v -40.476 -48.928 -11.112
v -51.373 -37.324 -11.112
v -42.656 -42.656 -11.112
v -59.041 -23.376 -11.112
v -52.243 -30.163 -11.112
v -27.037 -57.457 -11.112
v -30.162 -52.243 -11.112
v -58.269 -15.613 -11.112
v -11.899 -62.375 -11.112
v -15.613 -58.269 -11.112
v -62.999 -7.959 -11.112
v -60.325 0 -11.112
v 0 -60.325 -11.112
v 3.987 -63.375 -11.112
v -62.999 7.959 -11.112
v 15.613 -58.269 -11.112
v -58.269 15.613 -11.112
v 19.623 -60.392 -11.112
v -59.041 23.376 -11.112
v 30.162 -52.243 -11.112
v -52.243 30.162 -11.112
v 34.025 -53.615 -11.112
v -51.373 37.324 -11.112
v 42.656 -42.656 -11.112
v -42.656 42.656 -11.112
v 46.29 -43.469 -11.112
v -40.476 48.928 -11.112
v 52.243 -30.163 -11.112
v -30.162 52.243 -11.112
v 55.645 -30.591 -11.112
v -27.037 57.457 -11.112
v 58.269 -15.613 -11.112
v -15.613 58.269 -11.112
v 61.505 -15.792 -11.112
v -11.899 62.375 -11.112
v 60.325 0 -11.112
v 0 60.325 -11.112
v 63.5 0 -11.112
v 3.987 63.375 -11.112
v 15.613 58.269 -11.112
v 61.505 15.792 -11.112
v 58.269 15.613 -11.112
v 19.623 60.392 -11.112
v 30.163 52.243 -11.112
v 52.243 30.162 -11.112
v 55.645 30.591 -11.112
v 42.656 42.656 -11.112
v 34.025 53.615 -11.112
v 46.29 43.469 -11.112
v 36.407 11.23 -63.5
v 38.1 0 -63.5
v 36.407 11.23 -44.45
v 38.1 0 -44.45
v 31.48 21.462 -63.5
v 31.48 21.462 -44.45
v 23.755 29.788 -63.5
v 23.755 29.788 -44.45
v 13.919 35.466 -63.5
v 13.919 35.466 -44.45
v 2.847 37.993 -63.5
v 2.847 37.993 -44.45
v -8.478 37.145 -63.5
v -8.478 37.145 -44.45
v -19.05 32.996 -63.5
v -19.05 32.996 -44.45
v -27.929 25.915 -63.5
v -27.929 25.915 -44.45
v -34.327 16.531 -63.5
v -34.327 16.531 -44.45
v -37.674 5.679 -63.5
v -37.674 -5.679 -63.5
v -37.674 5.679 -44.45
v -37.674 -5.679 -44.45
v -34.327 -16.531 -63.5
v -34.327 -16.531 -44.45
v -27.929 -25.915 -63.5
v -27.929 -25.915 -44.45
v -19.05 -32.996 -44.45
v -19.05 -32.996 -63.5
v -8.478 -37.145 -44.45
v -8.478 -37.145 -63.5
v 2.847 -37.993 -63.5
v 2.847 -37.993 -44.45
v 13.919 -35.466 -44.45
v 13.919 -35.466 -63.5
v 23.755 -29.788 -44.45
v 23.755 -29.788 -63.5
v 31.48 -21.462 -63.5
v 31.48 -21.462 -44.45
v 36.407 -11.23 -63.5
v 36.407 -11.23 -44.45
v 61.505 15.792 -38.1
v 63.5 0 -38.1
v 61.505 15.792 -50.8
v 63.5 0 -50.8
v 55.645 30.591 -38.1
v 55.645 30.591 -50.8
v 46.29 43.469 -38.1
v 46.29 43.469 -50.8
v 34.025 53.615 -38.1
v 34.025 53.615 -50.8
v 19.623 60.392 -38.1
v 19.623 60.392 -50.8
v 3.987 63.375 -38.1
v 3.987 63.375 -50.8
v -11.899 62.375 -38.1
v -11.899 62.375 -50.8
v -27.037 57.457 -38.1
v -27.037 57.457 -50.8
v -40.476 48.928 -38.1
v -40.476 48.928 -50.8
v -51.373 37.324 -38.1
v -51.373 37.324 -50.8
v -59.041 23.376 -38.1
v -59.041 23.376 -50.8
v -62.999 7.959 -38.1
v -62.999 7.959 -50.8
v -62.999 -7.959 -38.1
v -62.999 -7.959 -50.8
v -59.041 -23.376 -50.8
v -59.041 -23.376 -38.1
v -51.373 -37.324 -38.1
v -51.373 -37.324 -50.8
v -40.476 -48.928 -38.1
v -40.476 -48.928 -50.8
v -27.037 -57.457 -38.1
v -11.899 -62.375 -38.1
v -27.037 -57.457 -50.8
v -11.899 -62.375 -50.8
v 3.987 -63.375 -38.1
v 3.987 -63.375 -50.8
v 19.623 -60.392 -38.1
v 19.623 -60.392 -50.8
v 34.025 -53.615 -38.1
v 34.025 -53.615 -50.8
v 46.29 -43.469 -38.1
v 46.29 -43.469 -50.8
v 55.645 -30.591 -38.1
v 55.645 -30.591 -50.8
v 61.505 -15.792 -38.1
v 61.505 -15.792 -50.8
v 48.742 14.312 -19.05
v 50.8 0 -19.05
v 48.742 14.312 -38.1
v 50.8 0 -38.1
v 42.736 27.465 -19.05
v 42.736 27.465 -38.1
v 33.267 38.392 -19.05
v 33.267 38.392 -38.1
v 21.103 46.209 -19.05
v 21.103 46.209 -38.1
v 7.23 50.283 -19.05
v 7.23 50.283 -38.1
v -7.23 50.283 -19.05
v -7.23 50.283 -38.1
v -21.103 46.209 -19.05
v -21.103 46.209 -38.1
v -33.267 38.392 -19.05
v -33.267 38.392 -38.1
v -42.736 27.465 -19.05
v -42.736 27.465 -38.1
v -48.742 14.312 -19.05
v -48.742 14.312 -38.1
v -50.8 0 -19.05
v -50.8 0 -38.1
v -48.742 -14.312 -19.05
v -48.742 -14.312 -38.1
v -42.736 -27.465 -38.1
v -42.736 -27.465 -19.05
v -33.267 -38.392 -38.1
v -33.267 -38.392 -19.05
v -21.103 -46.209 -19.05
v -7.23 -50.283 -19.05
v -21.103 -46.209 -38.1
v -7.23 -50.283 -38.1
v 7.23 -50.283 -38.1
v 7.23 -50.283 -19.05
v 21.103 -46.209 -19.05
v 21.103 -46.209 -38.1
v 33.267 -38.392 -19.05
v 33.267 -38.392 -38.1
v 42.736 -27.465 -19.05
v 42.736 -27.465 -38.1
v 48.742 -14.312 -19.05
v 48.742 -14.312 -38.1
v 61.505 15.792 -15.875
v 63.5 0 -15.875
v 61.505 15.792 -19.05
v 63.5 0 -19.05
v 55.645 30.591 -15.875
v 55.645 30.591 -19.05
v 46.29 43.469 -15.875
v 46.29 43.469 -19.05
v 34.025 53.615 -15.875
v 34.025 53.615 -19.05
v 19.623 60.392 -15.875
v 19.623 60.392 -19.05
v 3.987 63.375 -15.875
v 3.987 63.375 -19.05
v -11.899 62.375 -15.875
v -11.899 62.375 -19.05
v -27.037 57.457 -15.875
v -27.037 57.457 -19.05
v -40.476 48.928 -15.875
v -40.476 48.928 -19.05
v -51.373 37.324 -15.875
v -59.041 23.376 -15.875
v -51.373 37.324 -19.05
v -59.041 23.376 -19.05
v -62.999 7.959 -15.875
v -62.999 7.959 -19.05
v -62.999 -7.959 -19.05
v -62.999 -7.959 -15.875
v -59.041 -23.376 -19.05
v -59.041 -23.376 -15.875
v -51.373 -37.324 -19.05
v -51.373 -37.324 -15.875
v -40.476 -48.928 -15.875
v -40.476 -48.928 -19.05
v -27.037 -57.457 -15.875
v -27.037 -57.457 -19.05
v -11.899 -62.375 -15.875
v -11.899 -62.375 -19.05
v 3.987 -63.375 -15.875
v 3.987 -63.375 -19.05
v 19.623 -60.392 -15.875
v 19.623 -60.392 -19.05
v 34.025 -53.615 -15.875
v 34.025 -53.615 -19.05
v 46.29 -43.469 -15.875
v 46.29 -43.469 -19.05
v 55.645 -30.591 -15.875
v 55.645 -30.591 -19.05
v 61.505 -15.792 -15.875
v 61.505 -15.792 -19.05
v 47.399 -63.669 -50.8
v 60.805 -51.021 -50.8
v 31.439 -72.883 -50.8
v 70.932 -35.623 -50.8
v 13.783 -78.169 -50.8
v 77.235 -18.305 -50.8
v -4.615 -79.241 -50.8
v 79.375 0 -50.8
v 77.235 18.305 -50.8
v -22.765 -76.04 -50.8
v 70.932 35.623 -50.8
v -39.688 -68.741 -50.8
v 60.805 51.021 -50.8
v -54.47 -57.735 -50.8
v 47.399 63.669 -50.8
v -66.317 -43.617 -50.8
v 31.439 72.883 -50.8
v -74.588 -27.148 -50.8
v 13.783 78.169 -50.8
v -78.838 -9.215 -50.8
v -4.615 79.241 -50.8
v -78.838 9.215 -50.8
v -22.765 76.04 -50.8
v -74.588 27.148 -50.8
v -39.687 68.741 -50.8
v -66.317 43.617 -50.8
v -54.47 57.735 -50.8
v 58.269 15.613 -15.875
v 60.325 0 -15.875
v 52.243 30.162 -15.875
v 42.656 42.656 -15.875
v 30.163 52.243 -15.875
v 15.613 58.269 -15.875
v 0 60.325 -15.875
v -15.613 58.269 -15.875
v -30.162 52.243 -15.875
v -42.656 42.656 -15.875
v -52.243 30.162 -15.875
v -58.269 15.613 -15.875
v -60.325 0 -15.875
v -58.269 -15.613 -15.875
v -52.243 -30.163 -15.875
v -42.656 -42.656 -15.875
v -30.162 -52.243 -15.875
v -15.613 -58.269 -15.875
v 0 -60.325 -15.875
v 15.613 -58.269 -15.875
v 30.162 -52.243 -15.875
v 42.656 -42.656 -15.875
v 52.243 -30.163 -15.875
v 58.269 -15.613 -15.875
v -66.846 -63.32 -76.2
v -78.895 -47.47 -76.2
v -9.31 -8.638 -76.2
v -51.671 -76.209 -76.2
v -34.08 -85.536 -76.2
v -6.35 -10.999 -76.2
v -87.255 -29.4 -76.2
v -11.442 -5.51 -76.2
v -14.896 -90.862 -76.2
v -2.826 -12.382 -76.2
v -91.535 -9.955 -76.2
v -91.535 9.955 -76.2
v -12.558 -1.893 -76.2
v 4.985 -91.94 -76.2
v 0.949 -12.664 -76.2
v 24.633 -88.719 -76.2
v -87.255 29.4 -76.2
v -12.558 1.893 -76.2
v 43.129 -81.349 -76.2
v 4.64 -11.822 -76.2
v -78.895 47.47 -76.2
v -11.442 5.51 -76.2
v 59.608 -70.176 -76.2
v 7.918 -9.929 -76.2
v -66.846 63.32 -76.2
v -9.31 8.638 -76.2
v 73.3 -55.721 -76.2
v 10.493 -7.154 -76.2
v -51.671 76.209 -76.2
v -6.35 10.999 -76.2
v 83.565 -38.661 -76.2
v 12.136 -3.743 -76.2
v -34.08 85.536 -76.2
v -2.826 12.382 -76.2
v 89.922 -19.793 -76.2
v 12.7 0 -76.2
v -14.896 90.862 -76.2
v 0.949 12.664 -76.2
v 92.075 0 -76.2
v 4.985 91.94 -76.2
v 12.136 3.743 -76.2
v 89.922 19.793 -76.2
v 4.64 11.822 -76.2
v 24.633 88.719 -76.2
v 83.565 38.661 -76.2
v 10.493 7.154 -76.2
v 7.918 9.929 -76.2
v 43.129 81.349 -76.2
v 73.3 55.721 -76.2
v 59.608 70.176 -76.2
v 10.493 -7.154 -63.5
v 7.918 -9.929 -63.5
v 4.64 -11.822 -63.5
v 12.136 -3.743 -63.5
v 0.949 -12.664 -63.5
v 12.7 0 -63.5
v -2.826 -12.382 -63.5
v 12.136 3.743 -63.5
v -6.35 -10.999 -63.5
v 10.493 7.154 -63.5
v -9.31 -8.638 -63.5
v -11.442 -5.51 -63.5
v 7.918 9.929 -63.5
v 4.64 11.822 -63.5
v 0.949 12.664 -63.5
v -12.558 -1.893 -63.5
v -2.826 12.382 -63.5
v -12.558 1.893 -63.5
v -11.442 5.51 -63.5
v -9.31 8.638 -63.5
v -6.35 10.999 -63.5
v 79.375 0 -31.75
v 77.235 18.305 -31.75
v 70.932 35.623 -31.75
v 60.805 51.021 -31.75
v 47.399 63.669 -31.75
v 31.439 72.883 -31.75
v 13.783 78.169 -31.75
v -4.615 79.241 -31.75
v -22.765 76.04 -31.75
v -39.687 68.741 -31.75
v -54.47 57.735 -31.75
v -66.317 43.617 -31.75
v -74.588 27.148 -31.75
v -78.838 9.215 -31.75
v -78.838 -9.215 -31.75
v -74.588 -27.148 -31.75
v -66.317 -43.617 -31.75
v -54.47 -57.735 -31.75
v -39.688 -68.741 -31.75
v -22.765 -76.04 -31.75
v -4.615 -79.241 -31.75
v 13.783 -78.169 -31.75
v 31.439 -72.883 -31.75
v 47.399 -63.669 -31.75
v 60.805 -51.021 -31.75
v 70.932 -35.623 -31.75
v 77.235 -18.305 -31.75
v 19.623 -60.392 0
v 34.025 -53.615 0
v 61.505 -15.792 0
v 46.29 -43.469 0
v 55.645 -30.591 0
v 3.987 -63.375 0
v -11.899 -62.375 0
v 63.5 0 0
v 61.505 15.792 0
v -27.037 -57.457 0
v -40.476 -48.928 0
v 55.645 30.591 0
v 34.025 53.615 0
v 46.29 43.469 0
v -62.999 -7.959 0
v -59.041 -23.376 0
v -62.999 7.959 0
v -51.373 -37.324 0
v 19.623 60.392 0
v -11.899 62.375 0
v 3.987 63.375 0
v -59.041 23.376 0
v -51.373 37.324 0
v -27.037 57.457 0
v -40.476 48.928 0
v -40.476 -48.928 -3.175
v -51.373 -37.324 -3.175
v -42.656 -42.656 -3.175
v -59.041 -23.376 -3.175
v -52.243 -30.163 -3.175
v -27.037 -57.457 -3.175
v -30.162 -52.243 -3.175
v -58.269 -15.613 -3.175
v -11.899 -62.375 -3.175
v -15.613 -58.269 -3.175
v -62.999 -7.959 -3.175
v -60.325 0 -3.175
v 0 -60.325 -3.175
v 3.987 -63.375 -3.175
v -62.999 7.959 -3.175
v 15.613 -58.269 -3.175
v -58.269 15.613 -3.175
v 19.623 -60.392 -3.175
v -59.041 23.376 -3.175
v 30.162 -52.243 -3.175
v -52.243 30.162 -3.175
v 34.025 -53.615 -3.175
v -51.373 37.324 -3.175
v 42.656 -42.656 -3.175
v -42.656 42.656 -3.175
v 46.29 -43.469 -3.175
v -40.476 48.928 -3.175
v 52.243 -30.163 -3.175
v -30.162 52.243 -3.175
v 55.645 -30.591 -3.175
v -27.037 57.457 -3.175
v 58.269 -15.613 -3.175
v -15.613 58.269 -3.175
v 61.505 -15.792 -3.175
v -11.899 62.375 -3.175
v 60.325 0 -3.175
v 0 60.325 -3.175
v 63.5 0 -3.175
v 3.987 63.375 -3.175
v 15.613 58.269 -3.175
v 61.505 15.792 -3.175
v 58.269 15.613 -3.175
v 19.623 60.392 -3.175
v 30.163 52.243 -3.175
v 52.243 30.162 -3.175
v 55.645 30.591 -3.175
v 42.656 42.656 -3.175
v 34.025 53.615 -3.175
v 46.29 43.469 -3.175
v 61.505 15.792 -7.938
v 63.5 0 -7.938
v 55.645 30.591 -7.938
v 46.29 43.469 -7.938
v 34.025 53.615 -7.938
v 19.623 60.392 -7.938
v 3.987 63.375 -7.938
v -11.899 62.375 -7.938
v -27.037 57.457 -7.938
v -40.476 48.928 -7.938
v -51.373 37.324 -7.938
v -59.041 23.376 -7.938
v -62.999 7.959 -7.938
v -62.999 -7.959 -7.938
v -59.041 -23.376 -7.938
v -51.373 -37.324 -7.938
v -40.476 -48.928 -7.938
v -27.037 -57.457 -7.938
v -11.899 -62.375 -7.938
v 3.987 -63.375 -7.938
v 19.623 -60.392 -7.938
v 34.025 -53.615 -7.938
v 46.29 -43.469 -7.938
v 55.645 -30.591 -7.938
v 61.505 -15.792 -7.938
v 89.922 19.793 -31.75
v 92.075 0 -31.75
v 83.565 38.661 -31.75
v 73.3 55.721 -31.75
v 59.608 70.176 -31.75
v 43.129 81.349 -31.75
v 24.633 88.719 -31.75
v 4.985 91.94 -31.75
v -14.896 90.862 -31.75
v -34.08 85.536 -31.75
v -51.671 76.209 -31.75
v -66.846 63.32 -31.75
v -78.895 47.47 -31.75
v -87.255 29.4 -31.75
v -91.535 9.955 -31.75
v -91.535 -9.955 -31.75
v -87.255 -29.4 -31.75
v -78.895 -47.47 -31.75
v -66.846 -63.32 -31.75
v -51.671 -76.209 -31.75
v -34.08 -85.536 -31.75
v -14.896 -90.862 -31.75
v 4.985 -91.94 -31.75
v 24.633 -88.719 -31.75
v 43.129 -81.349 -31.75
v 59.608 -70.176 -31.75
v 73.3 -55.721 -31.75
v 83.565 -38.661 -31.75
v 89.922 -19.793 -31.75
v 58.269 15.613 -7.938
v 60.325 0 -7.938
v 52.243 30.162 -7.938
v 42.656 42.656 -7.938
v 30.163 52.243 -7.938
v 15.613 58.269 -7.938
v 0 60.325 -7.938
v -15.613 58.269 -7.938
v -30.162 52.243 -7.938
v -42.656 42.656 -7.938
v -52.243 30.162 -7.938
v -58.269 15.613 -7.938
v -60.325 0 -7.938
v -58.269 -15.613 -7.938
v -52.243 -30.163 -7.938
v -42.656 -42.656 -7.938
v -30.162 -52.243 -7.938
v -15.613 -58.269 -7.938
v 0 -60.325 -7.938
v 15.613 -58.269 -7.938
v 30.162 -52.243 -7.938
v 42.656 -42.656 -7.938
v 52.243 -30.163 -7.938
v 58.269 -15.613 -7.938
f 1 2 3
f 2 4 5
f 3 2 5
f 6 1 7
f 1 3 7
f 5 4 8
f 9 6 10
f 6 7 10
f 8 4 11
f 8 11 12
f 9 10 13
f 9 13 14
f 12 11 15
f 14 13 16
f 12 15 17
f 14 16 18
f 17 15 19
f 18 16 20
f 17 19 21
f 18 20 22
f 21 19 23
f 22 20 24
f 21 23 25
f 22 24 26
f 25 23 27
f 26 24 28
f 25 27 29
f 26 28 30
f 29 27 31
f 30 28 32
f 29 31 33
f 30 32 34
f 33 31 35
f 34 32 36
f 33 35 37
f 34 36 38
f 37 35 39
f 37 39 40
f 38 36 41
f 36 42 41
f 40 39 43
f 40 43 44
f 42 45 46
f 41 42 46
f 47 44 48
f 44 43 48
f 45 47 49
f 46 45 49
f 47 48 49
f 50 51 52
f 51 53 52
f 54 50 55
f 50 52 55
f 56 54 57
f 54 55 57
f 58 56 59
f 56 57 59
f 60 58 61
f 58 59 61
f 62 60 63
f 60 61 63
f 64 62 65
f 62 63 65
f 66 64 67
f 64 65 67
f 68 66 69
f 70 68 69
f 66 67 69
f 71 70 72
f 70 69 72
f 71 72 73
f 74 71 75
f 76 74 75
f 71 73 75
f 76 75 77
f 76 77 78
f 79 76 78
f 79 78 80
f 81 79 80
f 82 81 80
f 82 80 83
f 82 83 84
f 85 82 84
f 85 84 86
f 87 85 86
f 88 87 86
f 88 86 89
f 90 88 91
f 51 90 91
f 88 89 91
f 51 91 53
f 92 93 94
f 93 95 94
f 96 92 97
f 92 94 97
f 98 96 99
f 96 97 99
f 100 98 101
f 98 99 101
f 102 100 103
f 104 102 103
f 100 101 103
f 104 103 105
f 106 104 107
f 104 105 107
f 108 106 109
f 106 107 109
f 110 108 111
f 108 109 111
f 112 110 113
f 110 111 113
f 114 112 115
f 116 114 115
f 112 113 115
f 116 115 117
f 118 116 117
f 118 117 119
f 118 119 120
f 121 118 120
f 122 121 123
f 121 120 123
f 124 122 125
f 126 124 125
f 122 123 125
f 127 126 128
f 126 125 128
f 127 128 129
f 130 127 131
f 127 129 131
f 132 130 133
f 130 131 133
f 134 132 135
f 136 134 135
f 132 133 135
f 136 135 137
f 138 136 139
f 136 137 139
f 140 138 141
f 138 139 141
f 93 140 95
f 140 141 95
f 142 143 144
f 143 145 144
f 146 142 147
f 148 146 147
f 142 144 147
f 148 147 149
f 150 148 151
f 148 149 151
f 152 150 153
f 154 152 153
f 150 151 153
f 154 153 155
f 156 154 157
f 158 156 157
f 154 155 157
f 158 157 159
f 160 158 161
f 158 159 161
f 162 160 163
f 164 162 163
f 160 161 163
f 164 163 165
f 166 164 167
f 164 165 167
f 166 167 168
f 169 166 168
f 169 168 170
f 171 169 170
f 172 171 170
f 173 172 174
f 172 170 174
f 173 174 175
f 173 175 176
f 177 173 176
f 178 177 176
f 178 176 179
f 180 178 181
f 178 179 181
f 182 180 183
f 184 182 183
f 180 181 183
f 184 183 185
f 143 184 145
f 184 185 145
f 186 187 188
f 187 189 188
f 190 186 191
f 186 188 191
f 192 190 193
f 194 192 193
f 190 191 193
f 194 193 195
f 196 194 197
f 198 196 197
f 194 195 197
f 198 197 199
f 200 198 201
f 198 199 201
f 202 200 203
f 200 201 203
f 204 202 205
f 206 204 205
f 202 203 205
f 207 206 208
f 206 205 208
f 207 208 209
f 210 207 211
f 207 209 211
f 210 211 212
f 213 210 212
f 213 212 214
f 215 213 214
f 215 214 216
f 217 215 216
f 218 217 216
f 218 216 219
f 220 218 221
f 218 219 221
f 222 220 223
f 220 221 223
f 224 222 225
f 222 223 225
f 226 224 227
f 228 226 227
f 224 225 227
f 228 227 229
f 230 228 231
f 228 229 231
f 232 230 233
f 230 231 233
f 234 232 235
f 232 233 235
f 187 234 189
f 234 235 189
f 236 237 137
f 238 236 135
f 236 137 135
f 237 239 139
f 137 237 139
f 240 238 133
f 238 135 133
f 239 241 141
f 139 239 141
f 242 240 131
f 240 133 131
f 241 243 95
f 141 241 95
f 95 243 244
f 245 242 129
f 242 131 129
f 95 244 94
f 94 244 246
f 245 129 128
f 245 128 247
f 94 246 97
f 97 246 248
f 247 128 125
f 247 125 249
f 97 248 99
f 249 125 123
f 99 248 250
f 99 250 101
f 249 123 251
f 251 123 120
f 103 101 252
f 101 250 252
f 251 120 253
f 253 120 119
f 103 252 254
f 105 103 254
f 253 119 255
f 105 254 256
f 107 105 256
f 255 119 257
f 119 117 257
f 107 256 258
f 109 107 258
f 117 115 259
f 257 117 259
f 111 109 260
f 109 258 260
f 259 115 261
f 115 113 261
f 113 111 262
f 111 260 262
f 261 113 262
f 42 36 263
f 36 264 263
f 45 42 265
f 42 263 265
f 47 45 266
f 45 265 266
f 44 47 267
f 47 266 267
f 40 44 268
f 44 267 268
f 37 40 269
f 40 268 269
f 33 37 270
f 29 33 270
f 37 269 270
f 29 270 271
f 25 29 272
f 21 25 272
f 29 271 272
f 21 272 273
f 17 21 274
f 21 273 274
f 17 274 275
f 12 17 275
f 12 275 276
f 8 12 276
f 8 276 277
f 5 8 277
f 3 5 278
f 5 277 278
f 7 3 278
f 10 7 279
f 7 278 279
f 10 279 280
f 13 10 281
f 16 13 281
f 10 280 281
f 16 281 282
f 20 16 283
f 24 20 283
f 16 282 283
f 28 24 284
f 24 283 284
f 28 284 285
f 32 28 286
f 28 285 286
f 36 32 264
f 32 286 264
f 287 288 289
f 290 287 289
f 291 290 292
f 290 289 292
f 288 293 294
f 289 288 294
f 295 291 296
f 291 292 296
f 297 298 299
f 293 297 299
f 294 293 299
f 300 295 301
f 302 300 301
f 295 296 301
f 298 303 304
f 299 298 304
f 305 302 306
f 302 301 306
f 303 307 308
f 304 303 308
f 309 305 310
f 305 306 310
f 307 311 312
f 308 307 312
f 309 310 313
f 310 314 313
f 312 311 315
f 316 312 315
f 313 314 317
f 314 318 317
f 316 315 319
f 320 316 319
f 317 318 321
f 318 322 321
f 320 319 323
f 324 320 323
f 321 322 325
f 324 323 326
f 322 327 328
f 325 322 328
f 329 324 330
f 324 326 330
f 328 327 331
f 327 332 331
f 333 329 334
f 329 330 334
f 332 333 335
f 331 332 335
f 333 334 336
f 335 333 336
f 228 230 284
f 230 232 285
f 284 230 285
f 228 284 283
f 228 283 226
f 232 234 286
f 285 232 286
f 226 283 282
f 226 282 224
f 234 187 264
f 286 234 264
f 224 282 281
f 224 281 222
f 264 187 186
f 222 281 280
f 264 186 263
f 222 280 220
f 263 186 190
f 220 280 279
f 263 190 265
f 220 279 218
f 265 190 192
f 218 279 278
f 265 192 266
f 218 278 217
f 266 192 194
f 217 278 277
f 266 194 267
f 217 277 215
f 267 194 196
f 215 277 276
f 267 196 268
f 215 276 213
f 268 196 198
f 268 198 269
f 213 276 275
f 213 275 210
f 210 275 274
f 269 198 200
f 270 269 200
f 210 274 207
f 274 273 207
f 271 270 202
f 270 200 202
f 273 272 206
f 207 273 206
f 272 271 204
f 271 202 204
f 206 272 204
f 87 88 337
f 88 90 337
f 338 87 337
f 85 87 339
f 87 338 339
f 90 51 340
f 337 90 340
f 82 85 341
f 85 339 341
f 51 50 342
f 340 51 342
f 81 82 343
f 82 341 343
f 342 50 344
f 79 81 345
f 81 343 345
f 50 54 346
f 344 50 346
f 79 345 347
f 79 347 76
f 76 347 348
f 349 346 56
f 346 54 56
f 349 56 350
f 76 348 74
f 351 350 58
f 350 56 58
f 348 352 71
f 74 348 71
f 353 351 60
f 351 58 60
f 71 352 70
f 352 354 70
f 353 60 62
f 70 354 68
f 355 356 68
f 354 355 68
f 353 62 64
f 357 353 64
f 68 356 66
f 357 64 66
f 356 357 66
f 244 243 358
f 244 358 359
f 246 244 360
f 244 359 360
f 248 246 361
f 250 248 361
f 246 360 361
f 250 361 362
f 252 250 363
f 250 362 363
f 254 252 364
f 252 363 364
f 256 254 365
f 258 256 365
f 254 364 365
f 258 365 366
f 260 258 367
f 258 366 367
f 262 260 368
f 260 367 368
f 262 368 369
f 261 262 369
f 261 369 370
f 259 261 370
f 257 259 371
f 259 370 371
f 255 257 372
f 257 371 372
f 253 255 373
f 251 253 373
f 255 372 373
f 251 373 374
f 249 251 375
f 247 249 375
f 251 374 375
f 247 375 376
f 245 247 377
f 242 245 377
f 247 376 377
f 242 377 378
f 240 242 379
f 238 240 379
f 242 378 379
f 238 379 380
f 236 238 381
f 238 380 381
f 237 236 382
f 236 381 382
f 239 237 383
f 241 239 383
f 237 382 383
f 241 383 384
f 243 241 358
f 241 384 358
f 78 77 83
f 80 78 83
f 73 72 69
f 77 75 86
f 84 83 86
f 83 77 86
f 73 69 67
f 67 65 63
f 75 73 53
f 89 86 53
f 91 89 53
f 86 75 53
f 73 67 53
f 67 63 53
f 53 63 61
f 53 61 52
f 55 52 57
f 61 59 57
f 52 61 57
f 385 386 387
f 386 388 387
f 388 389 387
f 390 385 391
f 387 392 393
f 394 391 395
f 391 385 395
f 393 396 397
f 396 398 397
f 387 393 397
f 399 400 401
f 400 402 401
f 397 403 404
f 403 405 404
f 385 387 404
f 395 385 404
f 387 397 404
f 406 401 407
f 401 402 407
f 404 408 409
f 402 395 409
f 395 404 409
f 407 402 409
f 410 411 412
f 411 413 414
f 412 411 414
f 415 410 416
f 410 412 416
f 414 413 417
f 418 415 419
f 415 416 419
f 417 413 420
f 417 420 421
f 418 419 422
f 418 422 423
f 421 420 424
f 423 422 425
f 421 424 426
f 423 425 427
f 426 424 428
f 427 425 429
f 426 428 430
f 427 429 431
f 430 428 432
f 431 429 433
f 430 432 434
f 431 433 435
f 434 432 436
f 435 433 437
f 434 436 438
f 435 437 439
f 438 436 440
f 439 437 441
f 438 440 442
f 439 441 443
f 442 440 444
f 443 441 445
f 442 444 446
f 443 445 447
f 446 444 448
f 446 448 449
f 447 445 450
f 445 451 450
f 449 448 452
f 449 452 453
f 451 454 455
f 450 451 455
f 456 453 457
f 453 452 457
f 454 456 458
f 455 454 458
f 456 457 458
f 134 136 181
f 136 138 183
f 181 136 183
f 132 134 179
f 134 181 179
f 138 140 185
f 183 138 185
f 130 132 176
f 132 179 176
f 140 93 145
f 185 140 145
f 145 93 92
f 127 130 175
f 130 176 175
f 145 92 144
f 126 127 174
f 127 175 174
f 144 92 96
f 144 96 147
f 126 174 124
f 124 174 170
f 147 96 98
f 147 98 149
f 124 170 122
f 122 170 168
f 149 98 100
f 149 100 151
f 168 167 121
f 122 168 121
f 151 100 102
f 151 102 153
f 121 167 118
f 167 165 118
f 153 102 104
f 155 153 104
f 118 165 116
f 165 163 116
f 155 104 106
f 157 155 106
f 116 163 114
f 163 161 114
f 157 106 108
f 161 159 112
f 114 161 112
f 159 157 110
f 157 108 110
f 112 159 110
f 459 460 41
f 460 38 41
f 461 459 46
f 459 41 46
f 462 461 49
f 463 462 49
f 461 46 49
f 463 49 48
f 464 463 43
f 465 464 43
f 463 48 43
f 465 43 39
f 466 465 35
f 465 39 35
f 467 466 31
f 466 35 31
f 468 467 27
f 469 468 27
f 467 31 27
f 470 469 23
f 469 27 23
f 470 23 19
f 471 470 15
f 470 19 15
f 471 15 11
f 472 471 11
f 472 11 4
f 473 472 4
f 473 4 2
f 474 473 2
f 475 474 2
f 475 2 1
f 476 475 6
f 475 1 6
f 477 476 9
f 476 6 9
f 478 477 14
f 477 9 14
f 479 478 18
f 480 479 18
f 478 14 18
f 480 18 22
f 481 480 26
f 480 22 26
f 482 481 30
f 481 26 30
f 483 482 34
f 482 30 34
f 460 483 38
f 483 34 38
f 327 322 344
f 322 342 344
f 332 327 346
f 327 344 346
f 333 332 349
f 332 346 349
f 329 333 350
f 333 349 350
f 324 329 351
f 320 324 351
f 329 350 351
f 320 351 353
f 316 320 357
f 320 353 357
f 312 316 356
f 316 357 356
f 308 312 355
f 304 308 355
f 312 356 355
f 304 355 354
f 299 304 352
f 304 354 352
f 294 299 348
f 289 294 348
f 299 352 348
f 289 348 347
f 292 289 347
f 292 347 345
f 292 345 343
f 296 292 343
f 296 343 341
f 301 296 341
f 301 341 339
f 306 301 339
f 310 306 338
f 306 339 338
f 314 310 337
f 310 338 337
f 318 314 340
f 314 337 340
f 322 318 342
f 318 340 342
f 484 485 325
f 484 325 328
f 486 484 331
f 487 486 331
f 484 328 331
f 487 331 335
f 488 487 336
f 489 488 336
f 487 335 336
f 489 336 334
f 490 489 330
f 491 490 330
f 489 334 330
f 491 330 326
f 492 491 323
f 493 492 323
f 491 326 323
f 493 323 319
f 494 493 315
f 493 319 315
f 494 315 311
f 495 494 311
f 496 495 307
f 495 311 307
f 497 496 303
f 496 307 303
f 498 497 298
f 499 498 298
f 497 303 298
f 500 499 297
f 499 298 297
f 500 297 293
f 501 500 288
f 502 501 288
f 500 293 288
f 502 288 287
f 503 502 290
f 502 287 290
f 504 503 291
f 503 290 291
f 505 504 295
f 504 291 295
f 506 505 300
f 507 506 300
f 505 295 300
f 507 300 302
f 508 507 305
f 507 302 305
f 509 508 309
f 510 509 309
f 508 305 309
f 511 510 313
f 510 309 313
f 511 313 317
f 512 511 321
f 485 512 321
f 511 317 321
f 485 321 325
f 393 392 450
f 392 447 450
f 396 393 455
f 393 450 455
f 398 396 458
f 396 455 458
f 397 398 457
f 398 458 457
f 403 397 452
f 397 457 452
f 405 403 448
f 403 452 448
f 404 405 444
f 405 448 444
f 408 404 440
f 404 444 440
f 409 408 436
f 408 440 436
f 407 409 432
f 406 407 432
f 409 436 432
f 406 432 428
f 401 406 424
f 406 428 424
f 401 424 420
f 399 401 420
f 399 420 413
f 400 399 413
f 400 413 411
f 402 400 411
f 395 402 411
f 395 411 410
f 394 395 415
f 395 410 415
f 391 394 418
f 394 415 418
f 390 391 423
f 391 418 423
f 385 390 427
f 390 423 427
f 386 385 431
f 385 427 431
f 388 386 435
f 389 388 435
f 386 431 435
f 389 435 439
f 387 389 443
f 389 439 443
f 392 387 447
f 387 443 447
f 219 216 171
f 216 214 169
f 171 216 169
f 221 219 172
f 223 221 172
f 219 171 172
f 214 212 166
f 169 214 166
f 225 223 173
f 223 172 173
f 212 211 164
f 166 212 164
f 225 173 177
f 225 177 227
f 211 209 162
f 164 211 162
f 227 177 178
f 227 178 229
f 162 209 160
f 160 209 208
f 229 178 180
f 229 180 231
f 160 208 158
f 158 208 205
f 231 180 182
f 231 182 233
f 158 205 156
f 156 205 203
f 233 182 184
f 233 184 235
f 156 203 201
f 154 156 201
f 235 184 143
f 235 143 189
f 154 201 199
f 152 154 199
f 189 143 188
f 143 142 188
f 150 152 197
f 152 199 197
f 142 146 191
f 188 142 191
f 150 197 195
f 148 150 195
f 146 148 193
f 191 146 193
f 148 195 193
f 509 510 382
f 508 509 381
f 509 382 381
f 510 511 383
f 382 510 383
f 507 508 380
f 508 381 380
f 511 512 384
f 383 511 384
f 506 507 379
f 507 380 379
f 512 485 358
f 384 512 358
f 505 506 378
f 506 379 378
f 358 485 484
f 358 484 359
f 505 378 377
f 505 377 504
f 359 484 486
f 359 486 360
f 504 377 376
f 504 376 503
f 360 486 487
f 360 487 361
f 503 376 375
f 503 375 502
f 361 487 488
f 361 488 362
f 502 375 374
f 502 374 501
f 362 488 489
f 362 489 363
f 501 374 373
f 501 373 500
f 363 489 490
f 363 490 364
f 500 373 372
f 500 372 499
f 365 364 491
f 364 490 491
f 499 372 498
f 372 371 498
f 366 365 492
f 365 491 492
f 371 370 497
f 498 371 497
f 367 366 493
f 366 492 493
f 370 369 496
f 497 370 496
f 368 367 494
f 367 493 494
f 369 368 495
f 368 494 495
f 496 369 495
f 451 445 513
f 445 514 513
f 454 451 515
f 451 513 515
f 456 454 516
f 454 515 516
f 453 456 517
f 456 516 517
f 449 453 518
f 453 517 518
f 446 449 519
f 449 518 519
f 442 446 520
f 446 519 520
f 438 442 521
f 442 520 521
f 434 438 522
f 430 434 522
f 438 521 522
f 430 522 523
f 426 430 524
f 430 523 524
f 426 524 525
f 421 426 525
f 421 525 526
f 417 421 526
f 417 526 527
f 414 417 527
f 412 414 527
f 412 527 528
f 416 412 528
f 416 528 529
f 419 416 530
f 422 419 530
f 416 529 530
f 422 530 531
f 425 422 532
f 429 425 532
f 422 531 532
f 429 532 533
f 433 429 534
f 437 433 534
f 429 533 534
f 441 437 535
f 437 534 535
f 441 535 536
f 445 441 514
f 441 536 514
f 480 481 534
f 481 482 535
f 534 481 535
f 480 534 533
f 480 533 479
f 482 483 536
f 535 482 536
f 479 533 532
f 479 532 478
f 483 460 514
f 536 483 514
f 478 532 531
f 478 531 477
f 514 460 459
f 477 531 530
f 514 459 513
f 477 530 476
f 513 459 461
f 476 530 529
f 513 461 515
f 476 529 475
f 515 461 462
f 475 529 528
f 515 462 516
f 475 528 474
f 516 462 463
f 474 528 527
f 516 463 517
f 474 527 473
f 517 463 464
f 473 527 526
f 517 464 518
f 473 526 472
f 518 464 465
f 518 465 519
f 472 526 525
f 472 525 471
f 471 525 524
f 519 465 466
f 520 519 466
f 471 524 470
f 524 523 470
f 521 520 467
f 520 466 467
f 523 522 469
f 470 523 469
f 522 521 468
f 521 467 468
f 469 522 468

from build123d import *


with BuildPart() as part:
    # Sketch1 → Revolve1 (revolve)
    with BuildSketch(Plane(origin=(0, 0, 0), x_dir=(1, 0, 0), z_dir=(0, 1, 0))):
        Polygon((0, 44.45), (0, 0), (63.5, 0), (63.5, 3.175), (60.325, 3.175), (60.325, 7.9375), (63.5, 7.9375), (63.5, 11.1125), (60.325, 11.1125), (60.325, 15.875), (63.5, 15.875), (63.5, 19.05), (50.8, 19.05), (50.8, 38.1), (63.5, 38.1), (63.5, 50.8), (79.375, 50.8), (79.375, 31.75), (92.075, 31.75), (92.075, 76.2), (12.7, 76.2), (12.7, 63.5), (38.1, 63.5), (38.1, 44.45), align=None)
    revolve(axis=Axis((0, 0, -44.45), (0, 0, 1)))


solid = part.part
